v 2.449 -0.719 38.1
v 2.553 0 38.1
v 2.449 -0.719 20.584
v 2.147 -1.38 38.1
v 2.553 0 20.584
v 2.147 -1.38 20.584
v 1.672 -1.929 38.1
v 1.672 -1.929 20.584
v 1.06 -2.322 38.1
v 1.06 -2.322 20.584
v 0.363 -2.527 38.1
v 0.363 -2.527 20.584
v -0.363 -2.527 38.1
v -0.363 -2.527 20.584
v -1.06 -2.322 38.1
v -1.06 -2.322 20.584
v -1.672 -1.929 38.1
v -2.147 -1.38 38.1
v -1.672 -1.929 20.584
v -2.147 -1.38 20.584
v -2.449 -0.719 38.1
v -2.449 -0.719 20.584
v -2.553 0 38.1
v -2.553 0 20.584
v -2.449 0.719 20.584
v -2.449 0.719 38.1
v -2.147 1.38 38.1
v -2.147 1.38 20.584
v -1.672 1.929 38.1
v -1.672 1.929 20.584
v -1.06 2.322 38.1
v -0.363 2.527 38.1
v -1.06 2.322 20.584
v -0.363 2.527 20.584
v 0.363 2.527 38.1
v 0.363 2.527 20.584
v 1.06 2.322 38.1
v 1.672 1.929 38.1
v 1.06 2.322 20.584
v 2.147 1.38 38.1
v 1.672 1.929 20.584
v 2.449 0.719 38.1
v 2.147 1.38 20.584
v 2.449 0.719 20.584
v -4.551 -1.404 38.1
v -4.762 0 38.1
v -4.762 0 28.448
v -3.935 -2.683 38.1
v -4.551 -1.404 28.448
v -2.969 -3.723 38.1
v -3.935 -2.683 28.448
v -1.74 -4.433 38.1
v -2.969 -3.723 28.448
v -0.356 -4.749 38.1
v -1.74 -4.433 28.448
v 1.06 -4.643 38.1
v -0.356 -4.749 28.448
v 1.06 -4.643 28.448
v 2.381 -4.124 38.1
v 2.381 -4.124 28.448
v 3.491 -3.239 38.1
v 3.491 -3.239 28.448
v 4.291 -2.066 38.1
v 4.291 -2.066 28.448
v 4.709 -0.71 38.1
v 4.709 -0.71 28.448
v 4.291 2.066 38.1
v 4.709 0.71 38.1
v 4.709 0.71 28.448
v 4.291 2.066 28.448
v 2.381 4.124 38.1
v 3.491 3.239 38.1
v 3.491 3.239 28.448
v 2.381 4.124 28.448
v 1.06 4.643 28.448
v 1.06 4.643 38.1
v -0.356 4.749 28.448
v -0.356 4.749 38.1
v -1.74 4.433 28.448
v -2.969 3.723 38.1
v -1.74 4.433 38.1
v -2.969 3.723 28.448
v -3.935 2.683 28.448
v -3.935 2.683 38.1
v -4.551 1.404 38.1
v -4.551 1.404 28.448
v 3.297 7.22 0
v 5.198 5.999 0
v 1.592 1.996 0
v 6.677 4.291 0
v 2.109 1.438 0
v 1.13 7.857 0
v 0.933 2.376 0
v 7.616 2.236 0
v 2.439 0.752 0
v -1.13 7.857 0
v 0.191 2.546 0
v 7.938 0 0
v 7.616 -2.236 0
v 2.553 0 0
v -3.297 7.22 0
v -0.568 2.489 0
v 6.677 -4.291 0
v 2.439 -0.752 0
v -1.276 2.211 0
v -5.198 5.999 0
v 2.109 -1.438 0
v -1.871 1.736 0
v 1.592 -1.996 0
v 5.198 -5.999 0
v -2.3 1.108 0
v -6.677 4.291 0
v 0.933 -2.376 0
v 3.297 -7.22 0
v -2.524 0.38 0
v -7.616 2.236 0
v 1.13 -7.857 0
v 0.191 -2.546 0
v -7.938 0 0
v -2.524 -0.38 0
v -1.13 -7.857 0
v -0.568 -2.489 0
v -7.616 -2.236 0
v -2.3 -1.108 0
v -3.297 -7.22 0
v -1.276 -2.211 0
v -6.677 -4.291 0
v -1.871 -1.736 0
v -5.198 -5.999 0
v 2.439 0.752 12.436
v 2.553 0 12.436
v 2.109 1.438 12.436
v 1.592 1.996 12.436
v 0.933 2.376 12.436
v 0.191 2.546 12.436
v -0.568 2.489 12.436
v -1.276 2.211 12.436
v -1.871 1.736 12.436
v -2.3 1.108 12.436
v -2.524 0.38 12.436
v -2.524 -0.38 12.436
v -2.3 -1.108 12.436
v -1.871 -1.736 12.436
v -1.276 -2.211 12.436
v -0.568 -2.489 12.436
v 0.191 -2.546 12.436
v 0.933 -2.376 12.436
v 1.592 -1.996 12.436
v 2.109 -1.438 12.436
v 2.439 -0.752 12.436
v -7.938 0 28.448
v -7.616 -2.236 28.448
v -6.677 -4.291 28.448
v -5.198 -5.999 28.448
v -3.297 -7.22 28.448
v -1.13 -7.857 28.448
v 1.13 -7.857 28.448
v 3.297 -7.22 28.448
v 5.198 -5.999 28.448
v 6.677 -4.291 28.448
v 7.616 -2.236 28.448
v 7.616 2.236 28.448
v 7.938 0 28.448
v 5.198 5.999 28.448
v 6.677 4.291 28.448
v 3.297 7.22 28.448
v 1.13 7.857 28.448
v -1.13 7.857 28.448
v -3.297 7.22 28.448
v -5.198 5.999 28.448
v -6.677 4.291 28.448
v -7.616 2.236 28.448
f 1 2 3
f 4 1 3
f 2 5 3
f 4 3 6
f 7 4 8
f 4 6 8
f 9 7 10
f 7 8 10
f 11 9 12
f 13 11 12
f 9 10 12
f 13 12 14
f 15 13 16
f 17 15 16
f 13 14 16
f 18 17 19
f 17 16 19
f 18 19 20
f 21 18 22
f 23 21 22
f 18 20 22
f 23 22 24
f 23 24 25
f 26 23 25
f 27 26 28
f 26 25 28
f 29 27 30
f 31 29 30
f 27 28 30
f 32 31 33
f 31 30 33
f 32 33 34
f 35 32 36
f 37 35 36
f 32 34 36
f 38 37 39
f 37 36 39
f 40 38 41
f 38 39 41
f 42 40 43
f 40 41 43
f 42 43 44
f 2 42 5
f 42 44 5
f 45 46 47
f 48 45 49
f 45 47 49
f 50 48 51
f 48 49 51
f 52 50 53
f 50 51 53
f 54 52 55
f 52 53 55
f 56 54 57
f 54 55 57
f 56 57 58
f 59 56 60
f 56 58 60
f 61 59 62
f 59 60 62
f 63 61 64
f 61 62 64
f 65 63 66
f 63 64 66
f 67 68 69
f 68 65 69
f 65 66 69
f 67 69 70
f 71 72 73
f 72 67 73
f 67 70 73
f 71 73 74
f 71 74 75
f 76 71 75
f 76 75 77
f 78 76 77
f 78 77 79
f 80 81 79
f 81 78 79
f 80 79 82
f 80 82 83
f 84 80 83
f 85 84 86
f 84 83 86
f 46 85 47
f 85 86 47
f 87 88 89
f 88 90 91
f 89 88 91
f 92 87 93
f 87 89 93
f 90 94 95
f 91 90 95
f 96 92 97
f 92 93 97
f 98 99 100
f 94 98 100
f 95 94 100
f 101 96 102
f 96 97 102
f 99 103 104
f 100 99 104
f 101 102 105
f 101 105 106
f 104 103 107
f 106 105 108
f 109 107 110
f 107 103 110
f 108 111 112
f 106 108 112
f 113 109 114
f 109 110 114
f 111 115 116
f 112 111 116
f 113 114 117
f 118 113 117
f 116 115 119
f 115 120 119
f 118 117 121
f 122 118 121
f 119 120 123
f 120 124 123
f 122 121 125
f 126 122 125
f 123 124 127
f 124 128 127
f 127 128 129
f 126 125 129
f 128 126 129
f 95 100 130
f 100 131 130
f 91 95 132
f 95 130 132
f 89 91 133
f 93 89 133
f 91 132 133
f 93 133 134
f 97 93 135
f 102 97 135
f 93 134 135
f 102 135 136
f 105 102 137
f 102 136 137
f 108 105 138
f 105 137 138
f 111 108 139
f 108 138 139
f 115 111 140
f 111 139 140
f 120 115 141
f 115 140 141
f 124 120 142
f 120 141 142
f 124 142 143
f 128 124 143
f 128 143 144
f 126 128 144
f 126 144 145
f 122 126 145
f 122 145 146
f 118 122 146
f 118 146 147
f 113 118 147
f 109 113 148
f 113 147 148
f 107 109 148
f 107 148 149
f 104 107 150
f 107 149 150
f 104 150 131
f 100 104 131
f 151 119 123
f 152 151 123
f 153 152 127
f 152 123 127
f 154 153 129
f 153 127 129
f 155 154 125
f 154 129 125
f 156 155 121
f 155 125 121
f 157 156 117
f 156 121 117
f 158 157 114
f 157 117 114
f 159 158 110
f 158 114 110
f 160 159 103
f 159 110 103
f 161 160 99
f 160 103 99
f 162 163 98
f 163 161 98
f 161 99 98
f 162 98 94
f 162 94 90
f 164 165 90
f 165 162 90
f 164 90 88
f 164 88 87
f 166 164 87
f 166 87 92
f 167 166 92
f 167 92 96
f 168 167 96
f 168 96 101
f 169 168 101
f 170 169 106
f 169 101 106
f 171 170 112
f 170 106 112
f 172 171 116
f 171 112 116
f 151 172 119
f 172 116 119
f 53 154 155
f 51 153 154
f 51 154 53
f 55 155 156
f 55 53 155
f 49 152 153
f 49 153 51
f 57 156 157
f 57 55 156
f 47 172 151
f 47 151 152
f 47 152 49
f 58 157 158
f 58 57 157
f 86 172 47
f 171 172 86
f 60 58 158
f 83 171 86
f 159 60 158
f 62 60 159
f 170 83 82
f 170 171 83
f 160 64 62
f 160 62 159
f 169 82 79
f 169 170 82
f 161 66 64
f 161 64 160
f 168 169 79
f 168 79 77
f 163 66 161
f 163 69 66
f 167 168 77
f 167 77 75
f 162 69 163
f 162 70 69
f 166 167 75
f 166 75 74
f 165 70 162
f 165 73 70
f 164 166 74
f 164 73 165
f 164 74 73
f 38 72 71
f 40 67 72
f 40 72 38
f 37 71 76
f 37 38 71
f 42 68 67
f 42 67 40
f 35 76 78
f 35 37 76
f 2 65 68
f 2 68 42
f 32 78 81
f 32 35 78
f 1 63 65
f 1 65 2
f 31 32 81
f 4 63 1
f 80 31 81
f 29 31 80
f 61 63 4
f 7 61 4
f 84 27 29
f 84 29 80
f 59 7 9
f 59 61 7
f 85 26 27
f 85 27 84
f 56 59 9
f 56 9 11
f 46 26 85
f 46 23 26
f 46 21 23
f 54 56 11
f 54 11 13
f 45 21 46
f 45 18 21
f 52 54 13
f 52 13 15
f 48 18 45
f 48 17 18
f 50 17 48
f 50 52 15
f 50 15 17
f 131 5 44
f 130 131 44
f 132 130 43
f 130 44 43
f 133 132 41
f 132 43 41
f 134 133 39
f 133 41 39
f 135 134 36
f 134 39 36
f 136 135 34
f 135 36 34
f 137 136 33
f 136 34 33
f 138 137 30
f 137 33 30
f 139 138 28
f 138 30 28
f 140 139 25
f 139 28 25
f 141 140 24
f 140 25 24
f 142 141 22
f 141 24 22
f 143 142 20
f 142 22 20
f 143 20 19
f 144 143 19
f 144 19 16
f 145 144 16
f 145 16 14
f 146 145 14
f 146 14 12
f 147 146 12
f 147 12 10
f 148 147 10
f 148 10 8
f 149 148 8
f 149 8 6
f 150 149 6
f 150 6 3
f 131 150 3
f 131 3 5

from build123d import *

# Parameters (mm, degrees)
SKETCH2_R                   = 7.9375
CYLINDER_BASE_DEPTH         = 38.1
TRIM_1_DEPTH                = 40.71923731
TRIM_1_DEPTH_BACK           = 9.652
SKETCH3_OUTSIDE_W           = 26.72
SKETCH3_OUTSIDE_H           = 26.72
SKETCH3_OUTSIDE_R           = 4.7625
F_1_4_20_TAPPED_HOLE1_D     = 5.1054
F_1_4_20_TAPPED_HOLE1_DEPTH = 17.516183098
F_1_4_20_TAPPED_HOLE1_TIP   = 1.533816902
F_1_4_20_TAPPED_HOLE9_D     = 5.1054
F_1_4_20_TAPPED_HOLE9_DEPTH = 12.436183098
F_1_4_20_TAPPED_HOLE9_TIP   = 1.533816902
SKETCH20_R                  = 2.5527
CUT_EXTRUDE2_DEPTH          = 40.71923731


with BuildPart() as part:
    # Sketch2 → Cylinder Base (new body)
    with BuildSketch(Plane.XY):
        with Locations(Location((0, 0, 0), (0, 0, 180))):
            Circle(SKETCH2_R)
    extrude(amount=CYLINDER_BASE_DEPTH)

    # Sketch3 outside → Trim 1 (cut, two sides: drawn at the far end of the back side and taken through both)
    with BuildSketch(Plane.XY.offset(38.1).offset(-TRIM_1_DEPTH_BACK)):
        Rectangle(SKETCH3_OUTSIDE_W, SKETCH3_OUTSIDE_H)
        with Locations(Location((0, 0, 0), (0, 0, 180))):
            Circle(SKETCH3_OUTSIDE_R, mode=Mode.SUBTRACT)
    extrude(amount=TRIM_1_DEPTH + TRIM_1_DEPTH_BACK, mode=Mode.SUBTRACT)

    # 1/4-20 Tapped Hole1
    with Locations(Plane.XY.offset(38.1)):
        with Locations((0, 0)):
            Hole(F_1_4_20_TAPPED_HOLE1_D / 2, depth=F_1_4_20_TAPPED_HOLE1_DEPTH)
            with Locations((0, 0, -(F_1_4_20_TAPPED_HOLE1_DEPTH + F_1_4_20_TAPPED_HOLE1_TIP / 2))):  # 118° drill point
                Cone(0, F_1_4_20_TAPPED_HOLE1_D / 2, F_1_4_20_TAPPED_HOLE1_TIP, mode=Mode.SUBTRACT)

    # 1/4-20 Tapped Hole9
    with Locations(Plane(origin=(0, 0, 0), x_dir=(-1, 0, 0), z_dir=(0, 0, -1))):
        with Locations((0, 0)):
            Hole(F_1_4_20_TAPPED_HOLE9_D / 2, depth=F_1_4_20_TAPPED_HOLE9_DEPTH)
            with Locations((0, 0, -(F_1_4_20_TAPPED_HOLE9_DEPTH + F_1_4_20_TAPPED_HOLE9_TIP / 2))):  # 118° drill point
                Cone(0, F_1_4_20_TAPPED_HOLE9_D / 2, F_1_4_20_TAPPED_HOLE9_TIP, mode=Mode.SUBTRACT)

    # Sketch20 → Cut-Extrude2 (cut, through all)
    with BuildSketch(Plane.XY.offset(38.1)):
        Circle(SKETCH20_R)
    extrude(amount=-CUT_EXTRUDE2_DEPTH, mode=Mode.SUBTRACT)


solid = part.part
